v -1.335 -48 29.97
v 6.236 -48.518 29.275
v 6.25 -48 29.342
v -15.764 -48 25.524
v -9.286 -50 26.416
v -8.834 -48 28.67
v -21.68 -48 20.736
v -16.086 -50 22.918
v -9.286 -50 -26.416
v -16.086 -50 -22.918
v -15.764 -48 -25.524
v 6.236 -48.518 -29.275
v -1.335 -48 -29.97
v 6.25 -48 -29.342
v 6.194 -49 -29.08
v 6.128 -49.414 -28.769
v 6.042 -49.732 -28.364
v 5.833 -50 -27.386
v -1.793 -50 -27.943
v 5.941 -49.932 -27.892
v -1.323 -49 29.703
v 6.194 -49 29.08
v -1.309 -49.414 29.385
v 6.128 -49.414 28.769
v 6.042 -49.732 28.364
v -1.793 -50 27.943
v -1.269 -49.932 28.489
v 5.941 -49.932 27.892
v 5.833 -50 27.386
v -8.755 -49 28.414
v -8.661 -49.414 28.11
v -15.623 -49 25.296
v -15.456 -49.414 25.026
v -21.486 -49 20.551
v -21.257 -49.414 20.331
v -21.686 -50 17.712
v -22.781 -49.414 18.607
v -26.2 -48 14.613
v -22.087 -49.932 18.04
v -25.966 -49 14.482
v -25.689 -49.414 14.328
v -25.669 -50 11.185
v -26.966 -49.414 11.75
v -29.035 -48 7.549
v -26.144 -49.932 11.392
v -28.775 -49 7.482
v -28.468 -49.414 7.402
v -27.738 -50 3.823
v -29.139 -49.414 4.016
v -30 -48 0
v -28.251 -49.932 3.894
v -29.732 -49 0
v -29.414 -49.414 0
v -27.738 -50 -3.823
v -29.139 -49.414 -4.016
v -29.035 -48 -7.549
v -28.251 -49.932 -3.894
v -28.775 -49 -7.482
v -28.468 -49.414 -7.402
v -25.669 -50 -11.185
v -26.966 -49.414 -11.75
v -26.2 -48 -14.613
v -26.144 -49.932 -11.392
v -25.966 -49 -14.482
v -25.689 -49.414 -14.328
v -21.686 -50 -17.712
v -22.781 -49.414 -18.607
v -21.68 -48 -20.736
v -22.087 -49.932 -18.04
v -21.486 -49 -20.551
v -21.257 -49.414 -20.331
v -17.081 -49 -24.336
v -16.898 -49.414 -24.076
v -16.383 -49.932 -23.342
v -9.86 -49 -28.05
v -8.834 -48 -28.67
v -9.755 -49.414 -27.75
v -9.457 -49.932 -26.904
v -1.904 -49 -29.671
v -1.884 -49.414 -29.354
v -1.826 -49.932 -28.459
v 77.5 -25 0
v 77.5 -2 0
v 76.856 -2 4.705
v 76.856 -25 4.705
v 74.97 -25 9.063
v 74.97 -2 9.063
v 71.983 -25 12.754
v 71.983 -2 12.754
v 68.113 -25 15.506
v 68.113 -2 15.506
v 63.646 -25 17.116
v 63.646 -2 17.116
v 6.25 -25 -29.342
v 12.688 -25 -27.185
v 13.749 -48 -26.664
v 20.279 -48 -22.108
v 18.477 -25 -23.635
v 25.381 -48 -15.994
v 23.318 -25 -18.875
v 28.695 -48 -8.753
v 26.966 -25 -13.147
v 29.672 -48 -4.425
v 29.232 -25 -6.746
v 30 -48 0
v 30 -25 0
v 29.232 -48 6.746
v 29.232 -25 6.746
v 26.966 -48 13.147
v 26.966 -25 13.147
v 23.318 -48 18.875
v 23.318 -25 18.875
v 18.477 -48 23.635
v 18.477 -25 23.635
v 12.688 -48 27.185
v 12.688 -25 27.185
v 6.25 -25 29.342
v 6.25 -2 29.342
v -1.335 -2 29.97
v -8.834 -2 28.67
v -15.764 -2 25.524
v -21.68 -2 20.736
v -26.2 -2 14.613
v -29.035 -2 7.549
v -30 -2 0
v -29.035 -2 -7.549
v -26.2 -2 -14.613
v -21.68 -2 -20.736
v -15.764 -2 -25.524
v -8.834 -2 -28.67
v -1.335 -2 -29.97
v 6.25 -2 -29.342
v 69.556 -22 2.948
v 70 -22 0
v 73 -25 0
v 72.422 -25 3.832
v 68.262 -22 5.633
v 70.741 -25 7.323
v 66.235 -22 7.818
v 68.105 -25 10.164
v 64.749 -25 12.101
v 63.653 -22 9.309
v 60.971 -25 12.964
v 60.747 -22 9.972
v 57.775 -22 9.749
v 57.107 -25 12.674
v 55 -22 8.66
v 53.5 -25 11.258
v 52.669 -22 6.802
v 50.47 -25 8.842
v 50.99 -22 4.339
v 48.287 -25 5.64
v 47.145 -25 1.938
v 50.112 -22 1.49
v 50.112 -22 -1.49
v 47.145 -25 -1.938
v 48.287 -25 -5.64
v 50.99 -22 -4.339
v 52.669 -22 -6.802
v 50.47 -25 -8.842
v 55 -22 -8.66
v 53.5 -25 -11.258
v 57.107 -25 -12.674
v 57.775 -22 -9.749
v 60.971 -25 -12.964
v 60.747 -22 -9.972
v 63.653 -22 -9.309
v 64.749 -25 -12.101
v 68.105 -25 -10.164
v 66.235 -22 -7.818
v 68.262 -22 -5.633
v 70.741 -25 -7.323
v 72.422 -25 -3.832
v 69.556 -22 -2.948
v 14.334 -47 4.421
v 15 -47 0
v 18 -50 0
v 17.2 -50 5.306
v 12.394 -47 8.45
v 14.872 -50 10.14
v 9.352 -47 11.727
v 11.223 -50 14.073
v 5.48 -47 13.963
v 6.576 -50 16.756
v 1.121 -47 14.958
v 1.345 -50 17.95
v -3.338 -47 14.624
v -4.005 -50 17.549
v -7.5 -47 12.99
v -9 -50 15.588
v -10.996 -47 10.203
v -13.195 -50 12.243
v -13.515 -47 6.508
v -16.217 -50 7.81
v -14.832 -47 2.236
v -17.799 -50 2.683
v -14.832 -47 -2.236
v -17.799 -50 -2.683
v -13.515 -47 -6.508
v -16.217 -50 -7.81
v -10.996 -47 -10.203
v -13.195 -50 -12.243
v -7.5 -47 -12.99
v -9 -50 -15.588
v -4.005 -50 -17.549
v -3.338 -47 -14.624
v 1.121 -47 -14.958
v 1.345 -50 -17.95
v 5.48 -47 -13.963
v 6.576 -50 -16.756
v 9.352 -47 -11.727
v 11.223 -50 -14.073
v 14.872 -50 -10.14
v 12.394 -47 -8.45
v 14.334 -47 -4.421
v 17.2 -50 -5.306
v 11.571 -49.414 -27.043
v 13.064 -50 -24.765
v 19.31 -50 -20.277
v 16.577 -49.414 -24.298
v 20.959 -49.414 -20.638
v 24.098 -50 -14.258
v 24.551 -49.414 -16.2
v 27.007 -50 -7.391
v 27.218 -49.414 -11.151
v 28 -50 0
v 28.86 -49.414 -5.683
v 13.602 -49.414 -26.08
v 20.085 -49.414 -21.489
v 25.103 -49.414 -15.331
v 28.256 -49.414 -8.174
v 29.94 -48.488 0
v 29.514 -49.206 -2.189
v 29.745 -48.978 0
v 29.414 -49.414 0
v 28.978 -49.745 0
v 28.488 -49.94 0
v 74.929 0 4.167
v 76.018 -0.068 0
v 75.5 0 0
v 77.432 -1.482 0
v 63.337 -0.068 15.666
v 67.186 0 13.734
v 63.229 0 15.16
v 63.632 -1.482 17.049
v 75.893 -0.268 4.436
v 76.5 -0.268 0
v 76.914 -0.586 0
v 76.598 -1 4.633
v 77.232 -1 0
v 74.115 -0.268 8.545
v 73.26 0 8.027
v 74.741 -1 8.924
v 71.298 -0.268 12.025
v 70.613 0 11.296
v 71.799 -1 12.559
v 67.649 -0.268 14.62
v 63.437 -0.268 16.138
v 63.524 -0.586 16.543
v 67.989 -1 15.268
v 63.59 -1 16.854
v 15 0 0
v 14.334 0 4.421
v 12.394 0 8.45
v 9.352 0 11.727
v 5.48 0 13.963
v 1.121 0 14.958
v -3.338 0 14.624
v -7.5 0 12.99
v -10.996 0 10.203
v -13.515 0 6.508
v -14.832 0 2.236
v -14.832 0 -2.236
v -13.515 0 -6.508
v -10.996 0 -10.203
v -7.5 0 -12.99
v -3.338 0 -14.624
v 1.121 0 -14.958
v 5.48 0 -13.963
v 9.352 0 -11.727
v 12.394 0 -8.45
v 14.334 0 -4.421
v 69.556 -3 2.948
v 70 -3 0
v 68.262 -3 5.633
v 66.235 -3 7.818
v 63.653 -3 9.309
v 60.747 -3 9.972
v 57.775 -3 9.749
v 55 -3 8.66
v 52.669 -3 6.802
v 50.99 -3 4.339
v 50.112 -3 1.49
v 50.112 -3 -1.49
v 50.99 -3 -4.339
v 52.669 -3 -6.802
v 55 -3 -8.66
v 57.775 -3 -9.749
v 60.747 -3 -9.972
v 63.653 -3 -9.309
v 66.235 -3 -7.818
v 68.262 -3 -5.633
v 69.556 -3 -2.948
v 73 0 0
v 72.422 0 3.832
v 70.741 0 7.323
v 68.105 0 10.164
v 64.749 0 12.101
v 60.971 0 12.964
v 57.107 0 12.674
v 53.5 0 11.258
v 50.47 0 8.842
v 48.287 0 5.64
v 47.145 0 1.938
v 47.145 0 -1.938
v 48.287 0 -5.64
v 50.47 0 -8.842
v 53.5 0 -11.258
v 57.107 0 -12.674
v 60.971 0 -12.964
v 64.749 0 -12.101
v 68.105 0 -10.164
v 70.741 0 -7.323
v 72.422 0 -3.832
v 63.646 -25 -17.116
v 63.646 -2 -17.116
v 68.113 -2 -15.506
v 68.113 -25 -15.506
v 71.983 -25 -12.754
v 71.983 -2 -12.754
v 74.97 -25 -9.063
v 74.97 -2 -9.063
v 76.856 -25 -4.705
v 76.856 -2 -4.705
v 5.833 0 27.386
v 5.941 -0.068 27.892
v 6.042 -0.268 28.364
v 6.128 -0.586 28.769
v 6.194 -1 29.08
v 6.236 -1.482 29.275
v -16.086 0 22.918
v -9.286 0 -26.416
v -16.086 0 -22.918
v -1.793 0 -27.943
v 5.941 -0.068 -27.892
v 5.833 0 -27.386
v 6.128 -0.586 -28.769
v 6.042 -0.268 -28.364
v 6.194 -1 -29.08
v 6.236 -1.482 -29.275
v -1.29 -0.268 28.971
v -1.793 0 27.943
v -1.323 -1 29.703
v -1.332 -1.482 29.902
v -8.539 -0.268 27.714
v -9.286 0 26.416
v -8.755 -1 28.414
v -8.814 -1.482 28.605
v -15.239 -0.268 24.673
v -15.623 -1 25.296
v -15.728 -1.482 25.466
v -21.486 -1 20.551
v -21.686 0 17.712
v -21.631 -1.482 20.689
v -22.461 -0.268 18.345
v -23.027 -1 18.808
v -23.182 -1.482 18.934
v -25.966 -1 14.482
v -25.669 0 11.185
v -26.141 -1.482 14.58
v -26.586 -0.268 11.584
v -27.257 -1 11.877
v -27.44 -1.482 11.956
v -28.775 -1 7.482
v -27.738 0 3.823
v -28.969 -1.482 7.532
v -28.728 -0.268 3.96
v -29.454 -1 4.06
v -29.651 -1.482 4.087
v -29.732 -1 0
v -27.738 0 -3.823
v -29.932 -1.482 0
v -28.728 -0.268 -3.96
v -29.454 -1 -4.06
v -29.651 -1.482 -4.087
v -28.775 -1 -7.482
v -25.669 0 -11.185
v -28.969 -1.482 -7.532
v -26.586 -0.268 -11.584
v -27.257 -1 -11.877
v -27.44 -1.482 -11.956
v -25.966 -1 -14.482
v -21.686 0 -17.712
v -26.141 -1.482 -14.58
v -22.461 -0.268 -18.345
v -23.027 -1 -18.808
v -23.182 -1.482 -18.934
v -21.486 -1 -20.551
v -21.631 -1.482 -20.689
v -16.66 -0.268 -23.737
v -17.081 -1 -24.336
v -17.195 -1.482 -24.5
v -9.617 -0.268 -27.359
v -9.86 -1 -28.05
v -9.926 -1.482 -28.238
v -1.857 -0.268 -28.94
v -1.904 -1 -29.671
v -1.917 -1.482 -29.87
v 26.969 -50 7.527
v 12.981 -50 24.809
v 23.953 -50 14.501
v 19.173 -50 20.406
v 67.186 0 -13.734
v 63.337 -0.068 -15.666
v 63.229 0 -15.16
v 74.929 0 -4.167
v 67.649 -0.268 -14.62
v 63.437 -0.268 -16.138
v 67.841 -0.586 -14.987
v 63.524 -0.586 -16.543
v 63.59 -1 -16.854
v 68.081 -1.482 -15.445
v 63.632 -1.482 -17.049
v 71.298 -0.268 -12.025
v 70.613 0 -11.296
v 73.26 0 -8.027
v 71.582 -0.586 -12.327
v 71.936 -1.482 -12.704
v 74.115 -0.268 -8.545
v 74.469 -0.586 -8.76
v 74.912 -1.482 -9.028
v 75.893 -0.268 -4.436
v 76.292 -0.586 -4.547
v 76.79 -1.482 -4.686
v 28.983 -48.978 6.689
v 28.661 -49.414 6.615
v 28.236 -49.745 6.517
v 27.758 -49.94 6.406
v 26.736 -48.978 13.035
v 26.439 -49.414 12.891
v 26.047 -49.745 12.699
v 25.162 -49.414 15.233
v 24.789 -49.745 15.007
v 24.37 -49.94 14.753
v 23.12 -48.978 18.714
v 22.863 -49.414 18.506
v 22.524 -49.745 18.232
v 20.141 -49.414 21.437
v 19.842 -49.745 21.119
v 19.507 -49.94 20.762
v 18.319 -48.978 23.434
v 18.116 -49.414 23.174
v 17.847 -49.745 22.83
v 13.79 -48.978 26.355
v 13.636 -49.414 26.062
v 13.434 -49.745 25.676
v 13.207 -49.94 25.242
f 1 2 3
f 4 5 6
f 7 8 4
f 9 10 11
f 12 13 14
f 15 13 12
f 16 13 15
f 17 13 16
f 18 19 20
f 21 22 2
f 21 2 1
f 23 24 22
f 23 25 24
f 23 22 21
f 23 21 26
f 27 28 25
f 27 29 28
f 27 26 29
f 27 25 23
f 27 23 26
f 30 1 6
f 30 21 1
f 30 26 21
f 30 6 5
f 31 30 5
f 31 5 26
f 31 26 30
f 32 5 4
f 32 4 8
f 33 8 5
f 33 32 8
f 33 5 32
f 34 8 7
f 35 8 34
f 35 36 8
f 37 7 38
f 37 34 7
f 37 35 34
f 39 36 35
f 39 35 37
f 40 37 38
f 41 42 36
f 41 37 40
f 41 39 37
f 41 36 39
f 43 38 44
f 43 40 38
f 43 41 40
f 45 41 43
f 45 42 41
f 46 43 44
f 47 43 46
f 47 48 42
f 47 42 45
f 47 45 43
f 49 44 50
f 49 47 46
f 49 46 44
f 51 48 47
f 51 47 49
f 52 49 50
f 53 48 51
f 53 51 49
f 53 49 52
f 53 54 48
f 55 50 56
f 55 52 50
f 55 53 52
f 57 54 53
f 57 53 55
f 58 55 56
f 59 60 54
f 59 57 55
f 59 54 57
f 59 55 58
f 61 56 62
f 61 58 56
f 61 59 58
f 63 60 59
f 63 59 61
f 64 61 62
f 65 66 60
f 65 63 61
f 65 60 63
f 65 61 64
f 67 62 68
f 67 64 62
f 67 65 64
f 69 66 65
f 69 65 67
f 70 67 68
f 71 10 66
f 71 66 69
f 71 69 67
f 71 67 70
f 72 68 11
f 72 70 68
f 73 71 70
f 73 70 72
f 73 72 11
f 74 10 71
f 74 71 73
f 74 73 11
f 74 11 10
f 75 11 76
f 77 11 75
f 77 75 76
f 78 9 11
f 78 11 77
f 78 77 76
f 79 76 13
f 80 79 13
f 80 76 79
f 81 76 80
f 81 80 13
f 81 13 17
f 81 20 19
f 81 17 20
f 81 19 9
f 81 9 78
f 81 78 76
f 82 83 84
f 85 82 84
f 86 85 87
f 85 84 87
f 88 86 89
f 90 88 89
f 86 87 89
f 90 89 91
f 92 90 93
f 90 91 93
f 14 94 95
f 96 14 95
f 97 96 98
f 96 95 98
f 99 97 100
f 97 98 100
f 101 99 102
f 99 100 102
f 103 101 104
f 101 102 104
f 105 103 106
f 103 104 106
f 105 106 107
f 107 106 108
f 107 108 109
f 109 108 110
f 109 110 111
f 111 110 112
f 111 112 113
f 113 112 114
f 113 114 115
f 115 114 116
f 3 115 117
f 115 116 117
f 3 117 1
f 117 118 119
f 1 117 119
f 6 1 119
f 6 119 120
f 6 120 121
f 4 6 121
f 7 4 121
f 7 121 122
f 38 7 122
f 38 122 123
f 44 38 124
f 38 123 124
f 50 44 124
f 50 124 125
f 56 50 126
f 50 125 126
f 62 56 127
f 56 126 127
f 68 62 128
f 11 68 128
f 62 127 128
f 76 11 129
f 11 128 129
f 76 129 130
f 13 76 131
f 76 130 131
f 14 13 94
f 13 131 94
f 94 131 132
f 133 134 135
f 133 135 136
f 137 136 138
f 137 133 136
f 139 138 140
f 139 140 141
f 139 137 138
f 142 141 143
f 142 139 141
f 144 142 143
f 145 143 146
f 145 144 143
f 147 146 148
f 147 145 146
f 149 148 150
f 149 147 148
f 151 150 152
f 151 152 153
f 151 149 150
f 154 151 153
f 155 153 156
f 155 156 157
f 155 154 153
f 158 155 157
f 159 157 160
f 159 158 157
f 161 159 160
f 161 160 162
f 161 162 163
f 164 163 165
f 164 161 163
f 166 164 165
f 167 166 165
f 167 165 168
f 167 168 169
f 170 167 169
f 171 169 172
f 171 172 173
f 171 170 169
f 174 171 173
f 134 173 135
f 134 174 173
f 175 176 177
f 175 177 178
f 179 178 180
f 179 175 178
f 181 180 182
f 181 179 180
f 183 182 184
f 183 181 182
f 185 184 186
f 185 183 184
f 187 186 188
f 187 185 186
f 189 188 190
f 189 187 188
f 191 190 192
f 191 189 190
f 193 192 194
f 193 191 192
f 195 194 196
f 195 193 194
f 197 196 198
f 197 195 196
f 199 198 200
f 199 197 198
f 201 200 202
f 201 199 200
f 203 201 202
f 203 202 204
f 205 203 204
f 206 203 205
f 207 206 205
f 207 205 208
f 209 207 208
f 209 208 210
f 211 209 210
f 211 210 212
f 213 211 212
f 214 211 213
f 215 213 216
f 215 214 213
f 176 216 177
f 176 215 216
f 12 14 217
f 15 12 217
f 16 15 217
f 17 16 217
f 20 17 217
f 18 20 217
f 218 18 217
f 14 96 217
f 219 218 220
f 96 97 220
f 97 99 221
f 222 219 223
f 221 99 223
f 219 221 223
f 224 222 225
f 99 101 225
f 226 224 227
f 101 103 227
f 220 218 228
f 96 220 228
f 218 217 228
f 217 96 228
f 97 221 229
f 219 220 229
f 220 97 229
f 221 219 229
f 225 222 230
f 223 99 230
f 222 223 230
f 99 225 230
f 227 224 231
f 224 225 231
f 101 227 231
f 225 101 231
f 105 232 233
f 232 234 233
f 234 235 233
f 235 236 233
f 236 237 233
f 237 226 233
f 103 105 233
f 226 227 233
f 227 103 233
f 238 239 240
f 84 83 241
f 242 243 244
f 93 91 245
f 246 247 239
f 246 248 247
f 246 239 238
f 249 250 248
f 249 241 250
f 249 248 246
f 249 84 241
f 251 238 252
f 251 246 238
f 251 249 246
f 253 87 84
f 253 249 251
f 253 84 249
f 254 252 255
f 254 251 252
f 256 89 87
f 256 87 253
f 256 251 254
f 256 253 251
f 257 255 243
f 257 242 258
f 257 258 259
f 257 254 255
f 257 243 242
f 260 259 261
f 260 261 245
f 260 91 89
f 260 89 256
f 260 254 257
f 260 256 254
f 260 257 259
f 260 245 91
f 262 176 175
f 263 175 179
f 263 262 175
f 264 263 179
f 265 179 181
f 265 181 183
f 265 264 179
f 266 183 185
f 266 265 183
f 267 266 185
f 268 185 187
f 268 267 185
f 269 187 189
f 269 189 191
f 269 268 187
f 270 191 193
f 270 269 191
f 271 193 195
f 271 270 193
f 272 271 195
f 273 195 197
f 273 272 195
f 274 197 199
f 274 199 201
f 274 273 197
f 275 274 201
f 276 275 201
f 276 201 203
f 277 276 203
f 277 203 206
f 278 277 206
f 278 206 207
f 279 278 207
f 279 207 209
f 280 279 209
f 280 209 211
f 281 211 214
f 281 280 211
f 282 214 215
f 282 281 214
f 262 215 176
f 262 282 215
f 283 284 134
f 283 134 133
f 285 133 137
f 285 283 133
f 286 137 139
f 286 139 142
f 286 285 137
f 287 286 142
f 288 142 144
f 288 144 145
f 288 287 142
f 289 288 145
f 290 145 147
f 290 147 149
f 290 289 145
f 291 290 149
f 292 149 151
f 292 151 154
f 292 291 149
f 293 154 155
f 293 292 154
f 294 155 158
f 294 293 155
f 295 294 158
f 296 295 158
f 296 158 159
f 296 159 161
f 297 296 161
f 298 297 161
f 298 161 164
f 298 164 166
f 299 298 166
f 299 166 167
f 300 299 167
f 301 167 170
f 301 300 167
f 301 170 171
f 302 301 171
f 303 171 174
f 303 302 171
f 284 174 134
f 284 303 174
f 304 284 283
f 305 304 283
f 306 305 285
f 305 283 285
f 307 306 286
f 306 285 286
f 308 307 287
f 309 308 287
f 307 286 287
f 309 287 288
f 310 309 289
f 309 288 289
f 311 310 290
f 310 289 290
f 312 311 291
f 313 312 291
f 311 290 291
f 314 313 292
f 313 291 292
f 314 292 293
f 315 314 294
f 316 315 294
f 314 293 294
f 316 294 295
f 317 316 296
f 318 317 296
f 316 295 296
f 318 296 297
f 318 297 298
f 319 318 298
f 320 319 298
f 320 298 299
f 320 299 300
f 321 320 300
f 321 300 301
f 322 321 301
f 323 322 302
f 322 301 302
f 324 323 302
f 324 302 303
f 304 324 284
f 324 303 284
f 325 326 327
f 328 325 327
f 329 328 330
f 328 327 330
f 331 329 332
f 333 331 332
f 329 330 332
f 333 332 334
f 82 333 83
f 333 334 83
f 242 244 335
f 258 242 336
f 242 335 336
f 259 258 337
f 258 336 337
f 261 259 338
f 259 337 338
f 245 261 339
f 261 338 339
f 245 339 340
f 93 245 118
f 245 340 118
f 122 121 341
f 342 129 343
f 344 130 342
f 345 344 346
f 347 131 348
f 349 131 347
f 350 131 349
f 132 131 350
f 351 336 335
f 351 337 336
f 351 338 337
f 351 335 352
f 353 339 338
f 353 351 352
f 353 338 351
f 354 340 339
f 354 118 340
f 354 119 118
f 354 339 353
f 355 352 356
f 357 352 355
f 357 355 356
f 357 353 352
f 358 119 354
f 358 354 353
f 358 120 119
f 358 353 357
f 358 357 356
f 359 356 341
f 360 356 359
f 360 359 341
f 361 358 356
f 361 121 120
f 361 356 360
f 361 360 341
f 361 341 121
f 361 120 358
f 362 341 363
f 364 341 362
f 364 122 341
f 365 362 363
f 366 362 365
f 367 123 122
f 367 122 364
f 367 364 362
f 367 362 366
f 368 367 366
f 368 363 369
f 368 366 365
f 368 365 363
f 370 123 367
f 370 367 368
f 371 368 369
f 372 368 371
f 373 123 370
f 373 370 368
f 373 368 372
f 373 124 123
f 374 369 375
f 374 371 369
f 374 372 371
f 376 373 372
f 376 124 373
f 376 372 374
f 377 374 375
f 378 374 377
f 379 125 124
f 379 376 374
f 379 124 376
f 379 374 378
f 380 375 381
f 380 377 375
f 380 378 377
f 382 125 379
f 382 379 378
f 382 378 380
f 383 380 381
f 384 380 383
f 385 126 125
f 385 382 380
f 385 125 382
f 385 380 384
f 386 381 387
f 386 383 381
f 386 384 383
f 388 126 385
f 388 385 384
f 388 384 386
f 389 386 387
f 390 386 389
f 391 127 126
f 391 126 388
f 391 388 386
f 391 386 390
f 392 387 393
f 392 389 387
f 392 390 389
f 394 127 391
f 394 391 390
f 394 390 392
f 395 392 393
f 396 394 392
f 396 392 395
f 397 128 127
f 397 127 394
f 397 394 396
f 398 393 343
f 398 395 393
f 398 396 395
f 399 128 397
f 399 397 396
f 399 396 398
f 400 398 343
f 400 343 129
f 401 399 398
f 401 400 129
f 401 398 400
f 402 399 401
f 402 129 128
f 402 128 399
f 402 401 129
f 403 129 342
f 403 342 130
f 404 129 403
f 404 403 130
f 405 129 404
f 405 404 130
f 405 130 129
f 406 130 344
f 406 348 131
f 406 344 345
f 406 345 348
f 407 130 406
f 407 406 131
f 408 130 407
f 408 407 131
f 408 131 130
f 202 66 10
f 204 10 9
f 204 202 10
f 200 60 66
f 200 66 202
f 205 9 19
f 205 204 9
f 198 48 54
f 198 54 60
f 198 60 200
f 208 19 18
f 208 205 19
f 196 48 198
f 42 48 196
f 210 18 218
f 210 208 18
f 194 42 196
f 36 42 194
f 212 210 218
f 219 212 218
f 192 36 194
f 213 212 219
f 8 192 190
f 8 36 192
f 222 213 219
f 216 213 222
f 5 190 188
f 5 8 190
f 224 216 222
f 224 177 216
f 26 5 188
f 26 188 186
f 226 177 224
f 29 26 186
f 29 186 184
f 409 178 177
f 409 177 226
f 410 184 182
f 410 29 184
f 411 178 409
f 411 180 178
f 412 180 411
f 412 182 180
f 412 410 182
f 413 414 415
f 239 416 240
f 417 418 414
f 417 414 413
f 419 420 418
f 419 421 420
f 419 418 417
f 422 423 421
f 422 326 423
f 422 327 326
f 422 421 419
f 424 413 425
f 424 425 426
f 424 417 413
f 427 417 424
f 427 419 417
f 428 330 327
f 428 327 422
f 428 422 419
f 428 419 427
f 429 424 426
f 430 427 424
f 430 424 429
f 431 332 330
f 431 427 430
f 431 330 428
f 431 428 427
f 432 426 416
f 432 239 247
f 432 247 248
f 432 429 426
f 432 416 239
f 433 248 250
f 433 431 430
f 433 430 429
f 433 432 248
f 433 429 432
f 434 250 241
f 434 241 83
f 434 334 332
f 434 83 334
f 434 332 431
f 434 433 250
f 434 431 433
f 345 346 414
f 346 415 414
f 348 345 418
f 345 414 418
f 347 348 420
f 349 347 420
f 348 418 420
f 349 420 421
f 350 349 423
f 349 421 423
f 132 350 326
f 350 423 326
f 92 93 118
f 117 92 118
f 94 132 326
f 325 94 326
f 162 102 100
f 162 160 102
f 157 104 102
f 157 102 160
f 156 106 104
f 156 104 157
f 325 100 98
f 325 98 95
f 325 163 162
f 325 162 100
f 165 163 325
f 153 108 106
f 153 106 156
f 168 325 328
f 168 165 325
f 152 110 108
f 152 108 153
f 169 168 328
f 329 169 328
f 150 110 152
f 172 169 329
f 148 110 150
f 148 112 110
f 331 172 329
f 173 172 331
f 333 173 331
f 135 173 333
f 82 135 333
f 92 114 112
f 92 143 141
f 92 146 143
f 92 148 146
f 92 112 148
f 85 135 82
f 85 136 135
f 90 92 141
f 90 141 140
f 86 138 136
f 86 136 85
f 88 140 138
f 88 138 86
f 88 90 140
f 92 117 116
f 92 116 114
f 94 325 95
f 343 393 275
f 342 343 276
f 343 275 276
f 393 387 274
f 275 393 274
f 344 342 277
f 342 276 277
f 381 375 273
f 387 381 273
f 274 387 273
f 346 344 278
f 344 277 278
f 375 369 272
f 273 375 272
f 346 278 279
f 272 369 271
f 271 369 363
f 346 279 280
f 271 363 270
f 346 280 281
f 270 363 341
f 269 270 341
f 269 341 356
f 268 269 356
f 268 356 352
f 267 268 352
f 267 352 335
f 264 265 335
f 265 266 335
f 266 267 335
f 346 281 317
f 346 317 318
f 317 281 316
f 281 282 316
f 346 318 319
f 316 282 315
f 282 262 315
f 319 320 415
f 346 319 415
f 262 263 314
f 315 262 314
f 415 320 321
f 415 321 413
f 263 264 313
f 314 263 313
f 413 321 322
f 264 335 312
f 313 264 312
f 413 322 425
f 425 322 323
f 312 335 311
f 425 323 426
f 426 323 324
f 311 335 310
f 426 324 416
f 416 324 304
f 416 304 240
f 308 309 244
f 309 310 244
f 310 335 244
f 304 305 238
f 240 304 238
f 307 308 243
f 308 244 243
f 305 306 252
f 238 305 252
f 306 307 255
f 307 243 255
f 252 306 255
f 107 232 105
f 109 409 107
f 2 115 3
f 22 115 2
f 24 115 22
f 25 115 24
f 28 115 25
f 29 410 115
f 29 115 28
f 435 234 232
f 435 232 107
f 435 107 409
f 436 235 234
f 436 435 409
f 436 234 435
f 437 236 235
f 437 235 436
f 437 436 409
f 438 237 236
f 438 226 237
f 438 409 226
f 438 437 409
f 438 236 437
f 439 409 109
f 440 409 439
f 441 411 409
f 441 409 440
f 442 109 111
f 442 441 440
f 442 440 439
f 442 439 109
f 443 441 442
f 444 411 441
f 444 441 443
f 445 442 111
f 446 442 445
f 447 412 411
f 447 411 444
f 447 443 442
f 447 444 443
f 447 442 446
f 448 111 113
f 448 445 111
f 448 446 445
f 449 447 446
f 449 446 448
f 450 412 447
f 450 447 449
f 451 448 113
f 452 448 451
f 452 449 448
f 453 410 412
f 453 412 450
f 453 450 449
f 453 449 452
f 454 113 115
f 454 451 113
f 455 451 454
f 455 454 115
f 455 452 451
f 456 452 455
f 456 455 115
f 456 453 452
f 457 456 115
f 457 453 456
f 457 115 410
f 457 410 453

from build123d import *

# Parameters (mm, degrees)
F0_R     = 15
F0_R_2   = 10
F1_DEPTH = 25
F2_DEPTH = 50
F3_R     = 2
F4_SIZE  = 3


# Not quite as in the source:
# - a feature names something its author has since deleted; it is built from what else it names


with BuildPart() as f1:
    # F0 (on Front) → F1 (new body)
    with BuildSketch(Plane.XZ):
        with BuildLine():
            ThreePointArc((6.25, -29.3417364858), (23.3184476327, -18.8745860882), (30, 0))
            ThreePointArc((30, 0), (23.3184476327, 18.8745860882), (6.25, 29.3417364858))
            ThreePointArc((6.25, 29.3417364858), (-30, 0), (6.25, -29.3417364858))
        make_face()
        Circle(F0_R, mode=Mode.SUBTRACT)
        with BuildLine():
            ThreePointArc((6.25, 29.3417364858), (23.3184476327, 18.8745860882), (30, 0))
            ThreePointArc((30, 0), (23.3184476327, -18.8745860882), (6.25, -29.3417364858))
            Line((6.25, -29.3417364858), (63.6458333333, -17.11601295))
            ThreePointArc((63.6458333333, -17.11601295), (42.5, 0), (63.6458333333, 17.11601295))
            Line((63.6458333333, 17.11601295), (6.25, 29.3417364858))
        make_face()
        with BuildLine():
            ThreePointArc((77.5, 0), (73.6024277858, 11.0101752181), (63.6458333333, 17.11601295))
            ThreePointArc((63.6458333333, 17.11601295), (42.5, 0), (63.6458333333, -17.11601295))
            ThreePointArc((63.6458333333, -17.11601295), (73.6024277858, -11.0101752181), (77.5, 0))
        make_face()
        with Locations((60, 0)):
            Circle(F0_R_2, mode=Mode.SUBTRACT)
    extrude(amount=F1_DEPTH)

    # F0 (on Front) → F2 (join)
    with BuildSketch(Plane.XZ):
        with BuildLine():
            ThreePointArc((6.25, -29.3417364858), (23.3184476327, -18.8745860882), (30, 0))
            ThreePointArc((30, 0), (23.3184476327, 18.8745860882), (6.25, 29.3417364858))
            ThreePointArc((6.25, 29.3417364858), (-30, 0), (6.25, -29.3417364858))
        make_face()
        Circle(F0_R, mode=Mode.SUBTRACT)
    extrude(amount=F2_DEPTH)

    # F3
    f3_edges = [f1.edges().sort_by_distance(p)[0] for p in [
        (-6.25, -50, 29.341736),
        (34.947917, 0, -23.228875),
    ]]
    fillet(f3_edges, radius=F3_R)

    # F4
    f4_edges = [f1.edges().sort_by_distance(p)[0] for p in [
        (-15, -50, 0),
        (70, -12.5, 0),
        (50, 0, 0),
        (50, -25, 0),
    ]]
    chamfer(f4_edges, length=F4_SIZE)


solid = f1.part
